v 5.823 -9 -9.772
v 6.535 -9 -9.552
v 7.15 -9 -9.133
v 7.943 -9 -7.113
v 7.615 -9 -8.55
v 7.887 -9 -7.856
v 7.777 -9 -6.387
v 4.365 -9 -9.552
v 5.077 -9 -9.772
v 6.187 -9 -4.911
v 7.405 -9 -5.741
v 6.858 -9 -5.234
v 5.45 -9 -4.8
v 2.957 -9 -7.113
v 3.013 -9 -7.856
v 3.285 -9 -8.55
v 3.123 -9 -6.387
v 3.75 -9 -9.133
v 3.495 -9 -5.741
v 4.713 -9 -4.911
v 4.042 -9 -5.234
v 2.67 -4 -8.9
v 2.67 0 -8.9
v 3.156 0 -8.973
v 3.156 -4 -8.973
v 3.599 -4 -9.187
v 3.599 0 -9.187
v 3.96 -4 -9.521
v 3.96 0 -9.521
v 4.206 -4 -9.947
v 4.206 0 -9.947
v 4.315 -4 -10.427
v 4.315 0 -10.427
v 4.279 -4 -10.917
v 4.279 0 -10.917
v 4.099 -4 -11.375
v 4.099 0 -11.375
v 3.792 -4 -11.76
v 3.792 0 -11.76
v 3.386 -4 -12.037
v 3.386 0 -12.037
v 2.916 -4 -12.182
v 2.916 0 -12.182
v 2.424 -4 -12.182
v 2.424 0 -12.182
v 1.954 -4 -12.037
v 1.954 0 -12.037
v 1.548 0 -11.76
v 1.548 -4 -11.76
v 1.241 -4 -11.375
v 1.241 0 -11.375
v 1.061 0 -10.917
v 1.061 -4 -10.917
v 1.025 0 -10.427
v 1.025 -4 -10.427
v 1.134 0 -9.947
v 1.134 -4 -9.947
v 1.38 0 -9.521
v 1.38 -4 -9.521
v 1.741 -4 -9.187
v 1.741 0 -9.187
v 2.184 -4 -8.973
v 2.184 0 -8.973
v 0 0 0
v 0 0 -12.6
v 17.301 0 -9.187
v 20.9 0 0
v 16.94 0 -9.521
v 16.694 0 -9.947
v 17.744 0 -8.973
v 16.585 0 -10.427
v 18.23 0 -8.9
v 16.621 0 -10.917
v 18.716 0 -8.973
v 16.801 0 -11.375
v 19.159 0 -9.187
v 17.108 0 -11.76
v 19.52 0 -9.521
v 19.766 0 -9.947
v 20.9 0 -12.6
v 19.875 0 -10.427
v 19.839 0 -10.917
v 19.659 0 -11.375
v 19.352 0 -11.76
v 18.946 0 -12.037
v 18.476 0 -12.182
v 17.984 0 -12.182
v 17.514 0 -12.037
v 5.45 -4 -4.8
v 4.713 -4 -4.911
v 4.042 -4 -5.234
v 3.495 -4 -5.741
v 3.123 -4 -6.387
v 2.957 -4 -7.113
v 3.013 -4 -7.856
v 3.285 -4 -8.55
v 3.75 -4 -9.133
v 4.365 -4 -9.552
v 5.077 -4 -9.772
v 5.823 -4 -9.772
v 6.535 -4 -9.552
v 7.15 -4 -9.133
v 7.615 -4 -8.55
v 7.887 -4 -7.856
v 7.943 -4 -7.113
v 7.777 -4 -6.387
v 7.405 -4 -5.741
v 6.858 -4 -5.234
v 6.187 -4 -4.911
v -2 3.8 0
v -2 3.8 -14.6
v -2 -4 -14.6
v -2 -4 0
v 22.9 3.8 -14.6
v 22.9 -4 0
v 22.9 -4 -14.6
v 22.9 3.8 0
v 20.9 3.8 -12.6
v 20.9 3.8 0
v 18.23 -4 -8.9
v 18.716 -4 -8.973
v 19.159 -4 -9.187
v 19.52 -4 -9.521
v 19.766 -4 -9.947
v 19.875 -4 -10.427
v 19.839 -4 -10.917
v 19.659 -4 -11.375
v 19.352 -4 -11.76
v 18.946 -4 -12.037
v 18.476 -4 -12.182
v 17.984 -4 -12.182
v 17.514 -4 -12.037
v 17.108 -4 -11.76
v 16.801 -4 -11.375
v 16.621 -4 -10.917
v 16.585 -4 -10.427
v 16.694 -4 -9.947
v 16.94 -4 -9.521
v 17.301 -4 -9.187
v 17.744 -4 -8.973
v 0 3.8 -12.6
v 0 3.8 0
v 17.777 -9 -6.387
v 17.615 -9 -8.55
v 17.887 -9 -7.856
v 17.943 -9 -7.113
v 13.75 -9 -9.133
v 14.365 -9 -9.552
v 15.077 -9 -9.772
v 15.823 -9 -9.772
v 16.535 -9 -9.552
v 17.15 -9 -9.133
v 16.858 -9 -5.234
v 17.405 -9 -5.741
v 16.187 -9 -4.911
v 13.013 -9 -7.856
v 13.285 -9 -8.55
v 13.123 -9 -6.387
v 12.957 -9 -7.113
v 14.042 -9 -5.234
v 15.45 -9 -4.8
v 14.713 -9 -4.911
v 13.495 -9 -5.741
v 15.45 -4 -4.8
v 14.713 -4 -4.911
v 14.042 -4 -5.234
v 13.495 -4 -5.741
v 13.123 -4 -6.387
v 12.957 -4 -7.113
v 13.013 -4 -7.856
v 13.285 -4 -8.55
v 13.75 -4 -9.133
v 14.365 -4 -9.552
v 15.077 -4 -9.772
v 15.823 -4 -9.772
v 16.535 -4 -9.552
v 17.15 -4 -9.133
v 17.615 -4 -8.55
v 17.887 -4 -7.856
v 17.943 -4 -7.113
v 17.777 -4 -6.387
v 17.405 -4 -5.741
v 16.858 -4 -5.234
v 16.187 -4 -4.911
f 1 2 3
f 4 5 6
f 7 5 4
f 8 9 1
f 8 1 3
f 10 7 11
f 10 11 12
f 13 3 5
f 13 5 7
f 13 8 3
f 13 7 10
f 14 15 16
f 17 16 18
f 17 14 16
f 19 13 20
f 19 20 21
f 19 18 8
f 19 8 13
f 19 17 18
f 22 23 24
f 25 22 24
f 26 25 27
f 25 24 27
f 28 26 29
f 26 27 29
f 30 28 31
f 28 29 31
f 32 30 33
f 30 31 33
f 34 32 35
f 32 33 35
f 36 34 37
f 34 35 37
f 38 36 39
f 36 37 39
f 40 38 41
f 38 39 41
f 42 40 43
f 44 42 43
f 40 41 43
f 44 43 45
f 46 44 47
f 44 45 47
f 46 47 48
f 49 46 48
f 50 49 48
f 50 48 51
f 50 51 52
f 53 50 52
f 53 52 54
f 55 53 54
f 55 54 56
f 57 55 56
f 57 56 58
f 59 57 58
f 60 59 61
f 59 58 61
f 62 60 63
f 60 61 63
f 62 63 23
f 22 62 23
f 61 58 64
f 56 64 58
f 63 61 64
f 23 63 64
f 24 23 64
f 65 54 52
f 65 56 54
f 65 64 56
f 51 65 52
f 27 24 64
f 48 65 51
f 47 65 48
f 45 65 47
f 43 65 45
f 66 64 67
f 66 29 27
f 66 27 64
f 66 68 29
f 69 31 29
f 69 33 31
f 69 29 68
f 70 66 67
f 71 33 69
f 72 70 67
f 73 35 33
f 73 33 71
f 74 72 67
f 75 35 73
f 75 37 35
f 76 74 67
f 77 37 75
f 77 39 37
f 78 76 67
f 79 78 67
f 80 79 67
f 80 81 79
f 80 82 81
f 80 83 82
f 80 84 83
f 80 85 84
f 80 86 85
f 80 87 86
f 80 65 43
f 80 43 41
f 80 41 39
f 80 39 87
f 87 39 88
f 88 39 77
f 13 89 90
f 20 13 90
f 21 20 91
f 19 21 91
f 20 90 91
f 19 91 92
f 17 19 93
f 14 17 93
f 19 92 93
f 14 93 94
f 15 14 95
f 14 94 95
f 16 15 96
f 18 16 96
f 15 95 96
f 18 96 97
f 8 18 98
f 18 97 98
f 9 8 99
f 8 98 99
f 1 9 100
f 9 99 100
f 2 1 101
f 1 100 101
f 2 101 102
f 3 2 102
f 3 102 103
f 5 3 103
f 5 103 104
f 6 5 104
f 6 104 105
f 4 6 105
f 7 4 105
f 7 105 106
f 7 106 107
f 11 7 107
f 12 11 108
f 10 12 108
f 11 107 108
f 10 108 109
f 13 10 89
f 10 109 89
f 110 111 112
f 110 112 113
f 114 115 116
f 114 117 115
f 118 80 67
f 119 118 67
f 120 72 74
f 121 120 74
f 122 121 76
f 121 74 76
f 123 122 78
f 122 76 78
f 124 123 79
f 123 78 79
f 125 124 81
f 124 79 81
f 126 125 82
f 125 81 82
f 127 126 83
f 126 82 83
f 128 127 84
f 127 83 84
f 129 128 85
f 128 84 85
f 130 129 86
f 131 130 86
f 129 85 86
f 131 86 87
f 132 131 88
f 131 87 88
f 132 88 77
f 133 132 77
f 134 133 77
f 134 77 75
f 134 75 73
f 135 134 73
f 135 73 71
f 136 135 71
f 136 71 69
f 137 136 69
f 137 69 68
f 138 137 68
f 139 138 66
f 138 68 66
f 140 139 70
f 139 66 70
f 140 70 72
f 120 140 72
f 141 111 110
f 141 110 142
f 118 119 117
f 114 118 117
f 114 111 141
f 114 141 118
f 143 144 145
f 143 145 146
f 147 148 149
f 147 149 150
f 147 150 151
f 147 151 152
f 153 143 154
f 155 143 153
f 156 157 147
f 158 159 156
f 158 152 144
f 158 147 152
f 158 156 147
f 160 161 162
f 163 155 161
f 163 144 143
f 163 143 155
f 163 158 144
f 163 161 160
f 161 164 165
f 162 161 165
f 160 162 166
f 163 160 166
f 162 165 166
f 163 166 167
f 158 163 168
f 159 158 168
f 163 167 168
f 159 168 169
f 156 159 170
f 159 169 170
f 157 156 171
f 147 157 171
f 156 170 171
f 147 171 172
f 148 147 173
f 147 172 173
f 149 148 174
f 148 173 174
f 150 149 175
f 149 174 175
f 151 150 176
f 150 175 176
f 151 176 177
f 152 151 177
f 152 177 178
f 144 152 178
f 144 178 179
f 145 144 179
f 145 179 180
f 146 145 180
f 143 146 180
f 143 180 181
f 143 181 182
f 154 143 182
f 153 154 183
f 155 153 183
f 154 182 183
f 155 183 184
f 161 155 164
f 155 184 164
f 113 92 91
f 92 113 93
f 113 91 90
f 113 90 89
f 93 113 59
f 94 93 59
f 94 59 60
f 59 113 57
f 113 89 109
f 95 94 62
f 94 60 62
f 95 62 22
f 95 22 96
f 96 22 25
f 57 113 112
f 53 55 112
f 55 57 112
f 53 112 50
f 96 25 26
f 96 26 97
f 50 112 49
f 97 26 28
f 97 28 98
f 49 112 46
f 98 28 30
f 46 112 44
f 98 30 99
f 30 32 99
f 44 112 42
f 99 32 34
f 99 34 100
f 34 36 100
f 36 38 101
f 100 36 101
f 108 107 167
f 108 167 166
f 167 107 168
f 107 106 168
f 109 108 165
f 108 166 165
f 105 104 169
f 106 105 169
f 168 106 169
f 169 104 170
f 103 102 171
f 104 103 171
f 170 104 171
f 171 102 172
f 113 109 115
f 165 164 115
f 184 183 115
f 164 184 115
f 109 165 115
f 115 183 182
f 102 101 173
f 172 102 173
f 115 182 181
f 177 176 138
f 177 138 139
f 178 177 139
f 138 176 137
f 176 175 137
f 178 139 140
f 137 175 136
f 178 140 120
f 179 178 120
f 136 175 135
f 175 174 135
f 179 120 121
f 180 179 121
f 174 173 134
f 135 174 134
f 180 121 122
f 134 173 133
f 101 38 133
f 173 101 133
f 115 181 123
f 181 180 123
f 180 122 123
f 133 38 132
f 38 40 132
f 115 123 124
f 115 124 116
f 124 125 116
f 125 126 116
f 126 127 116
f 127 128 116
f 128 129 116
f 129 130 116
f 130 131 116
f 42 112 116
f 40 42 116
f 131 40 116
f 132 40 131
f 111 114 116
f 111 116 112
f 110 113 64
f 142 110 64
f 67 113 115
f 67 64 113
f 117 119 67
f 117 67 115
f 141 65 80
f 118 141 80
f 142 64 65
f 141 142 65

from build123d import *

# Parameters (mm, degrees)
BOSS_EXTRUDE1_DEPTH = 3.8
SKETCH1_3_W         = 20.9
SKETCH1_3_H         = 12.6
BOSS_EXTRUDE2_DEPTH = 4
SKETCH3_R           = 2.5
BOSS_EXTRUDE4_DEPTH = 5
SKETCH5_R           = 1.65
CUT_EXTRUDE1_DEPTH  = 4


with BuildPart() as part:
    # Sketch1 → Boss-Extrude1 (new body)
    with BuildSketch(Plane(origin=(0, 0, 0), x_dir=(1, 0, 0), z_dir=(0, 1, 0))):
        Polygon((22.9, 14.6), (-2, 14.6), (-2, 0), (0, 0), (0, 12.6), (20.9, 12.6), (20.9, 0), (22.9, 0), align=None)
    extrude(amount=BOSS_EXTRUDE1_DEPTH)

    # Sketch1<3> → Boss-Extrude2 (add)
    with BuildSketch(Plane(origin=(0, 0, 0), x_dir=(1, 0, 0), z_dir=(0, 1, 0))):
        with Locations((10.45, 6.3)):
            Rectangle(SKETCH1_3_W, SKETCH1_3_H)
        Polygon((22.9, 14.6), (-2, 14.6), (-2, 0), (0, 0), (0, 12.6), (20.9, 12.6), (20.9, 0), (22.9, 0), align=None)
    extrude(amount=-BOSS_EXTRUDE2_DEPTH)

    # Sketch3 → Boss-Extrude4 (add)
    with BuildSketch(Plane.XZ.offset(4)):
        with Locations(Location((5.45, -7.3, 0), (0, 0, 90))):
            Circle(SKETCH3_R)
        with Locations(Location((15.45, -7.3, 0), (0, 0, 90))):
            Circle(SKETCH3_R)
    extrude(amount=BOSS_EXTRUDE4_DEPTH)

    # Sketch5 → Cut-Extrude1 (cut)
    with BuildSketch(Plane(origin=(0, 0, 0), x_dir=(1, 0, 0), z_dir=(0, 1, 0))):
        with Locations(Location((2.67, 10.55, 0), (0, 0, 270))):
            Circle(SKETCH5_R)
        with Locations(Location((18.23, 10.55, 0), (0, 0, 270))):
            Circle(SKETCH5_R)
    extrude(amount=-CUT_EXTRUDE1_DEPTH, mode=Mode.SUBTRACT)


solid = part.part
